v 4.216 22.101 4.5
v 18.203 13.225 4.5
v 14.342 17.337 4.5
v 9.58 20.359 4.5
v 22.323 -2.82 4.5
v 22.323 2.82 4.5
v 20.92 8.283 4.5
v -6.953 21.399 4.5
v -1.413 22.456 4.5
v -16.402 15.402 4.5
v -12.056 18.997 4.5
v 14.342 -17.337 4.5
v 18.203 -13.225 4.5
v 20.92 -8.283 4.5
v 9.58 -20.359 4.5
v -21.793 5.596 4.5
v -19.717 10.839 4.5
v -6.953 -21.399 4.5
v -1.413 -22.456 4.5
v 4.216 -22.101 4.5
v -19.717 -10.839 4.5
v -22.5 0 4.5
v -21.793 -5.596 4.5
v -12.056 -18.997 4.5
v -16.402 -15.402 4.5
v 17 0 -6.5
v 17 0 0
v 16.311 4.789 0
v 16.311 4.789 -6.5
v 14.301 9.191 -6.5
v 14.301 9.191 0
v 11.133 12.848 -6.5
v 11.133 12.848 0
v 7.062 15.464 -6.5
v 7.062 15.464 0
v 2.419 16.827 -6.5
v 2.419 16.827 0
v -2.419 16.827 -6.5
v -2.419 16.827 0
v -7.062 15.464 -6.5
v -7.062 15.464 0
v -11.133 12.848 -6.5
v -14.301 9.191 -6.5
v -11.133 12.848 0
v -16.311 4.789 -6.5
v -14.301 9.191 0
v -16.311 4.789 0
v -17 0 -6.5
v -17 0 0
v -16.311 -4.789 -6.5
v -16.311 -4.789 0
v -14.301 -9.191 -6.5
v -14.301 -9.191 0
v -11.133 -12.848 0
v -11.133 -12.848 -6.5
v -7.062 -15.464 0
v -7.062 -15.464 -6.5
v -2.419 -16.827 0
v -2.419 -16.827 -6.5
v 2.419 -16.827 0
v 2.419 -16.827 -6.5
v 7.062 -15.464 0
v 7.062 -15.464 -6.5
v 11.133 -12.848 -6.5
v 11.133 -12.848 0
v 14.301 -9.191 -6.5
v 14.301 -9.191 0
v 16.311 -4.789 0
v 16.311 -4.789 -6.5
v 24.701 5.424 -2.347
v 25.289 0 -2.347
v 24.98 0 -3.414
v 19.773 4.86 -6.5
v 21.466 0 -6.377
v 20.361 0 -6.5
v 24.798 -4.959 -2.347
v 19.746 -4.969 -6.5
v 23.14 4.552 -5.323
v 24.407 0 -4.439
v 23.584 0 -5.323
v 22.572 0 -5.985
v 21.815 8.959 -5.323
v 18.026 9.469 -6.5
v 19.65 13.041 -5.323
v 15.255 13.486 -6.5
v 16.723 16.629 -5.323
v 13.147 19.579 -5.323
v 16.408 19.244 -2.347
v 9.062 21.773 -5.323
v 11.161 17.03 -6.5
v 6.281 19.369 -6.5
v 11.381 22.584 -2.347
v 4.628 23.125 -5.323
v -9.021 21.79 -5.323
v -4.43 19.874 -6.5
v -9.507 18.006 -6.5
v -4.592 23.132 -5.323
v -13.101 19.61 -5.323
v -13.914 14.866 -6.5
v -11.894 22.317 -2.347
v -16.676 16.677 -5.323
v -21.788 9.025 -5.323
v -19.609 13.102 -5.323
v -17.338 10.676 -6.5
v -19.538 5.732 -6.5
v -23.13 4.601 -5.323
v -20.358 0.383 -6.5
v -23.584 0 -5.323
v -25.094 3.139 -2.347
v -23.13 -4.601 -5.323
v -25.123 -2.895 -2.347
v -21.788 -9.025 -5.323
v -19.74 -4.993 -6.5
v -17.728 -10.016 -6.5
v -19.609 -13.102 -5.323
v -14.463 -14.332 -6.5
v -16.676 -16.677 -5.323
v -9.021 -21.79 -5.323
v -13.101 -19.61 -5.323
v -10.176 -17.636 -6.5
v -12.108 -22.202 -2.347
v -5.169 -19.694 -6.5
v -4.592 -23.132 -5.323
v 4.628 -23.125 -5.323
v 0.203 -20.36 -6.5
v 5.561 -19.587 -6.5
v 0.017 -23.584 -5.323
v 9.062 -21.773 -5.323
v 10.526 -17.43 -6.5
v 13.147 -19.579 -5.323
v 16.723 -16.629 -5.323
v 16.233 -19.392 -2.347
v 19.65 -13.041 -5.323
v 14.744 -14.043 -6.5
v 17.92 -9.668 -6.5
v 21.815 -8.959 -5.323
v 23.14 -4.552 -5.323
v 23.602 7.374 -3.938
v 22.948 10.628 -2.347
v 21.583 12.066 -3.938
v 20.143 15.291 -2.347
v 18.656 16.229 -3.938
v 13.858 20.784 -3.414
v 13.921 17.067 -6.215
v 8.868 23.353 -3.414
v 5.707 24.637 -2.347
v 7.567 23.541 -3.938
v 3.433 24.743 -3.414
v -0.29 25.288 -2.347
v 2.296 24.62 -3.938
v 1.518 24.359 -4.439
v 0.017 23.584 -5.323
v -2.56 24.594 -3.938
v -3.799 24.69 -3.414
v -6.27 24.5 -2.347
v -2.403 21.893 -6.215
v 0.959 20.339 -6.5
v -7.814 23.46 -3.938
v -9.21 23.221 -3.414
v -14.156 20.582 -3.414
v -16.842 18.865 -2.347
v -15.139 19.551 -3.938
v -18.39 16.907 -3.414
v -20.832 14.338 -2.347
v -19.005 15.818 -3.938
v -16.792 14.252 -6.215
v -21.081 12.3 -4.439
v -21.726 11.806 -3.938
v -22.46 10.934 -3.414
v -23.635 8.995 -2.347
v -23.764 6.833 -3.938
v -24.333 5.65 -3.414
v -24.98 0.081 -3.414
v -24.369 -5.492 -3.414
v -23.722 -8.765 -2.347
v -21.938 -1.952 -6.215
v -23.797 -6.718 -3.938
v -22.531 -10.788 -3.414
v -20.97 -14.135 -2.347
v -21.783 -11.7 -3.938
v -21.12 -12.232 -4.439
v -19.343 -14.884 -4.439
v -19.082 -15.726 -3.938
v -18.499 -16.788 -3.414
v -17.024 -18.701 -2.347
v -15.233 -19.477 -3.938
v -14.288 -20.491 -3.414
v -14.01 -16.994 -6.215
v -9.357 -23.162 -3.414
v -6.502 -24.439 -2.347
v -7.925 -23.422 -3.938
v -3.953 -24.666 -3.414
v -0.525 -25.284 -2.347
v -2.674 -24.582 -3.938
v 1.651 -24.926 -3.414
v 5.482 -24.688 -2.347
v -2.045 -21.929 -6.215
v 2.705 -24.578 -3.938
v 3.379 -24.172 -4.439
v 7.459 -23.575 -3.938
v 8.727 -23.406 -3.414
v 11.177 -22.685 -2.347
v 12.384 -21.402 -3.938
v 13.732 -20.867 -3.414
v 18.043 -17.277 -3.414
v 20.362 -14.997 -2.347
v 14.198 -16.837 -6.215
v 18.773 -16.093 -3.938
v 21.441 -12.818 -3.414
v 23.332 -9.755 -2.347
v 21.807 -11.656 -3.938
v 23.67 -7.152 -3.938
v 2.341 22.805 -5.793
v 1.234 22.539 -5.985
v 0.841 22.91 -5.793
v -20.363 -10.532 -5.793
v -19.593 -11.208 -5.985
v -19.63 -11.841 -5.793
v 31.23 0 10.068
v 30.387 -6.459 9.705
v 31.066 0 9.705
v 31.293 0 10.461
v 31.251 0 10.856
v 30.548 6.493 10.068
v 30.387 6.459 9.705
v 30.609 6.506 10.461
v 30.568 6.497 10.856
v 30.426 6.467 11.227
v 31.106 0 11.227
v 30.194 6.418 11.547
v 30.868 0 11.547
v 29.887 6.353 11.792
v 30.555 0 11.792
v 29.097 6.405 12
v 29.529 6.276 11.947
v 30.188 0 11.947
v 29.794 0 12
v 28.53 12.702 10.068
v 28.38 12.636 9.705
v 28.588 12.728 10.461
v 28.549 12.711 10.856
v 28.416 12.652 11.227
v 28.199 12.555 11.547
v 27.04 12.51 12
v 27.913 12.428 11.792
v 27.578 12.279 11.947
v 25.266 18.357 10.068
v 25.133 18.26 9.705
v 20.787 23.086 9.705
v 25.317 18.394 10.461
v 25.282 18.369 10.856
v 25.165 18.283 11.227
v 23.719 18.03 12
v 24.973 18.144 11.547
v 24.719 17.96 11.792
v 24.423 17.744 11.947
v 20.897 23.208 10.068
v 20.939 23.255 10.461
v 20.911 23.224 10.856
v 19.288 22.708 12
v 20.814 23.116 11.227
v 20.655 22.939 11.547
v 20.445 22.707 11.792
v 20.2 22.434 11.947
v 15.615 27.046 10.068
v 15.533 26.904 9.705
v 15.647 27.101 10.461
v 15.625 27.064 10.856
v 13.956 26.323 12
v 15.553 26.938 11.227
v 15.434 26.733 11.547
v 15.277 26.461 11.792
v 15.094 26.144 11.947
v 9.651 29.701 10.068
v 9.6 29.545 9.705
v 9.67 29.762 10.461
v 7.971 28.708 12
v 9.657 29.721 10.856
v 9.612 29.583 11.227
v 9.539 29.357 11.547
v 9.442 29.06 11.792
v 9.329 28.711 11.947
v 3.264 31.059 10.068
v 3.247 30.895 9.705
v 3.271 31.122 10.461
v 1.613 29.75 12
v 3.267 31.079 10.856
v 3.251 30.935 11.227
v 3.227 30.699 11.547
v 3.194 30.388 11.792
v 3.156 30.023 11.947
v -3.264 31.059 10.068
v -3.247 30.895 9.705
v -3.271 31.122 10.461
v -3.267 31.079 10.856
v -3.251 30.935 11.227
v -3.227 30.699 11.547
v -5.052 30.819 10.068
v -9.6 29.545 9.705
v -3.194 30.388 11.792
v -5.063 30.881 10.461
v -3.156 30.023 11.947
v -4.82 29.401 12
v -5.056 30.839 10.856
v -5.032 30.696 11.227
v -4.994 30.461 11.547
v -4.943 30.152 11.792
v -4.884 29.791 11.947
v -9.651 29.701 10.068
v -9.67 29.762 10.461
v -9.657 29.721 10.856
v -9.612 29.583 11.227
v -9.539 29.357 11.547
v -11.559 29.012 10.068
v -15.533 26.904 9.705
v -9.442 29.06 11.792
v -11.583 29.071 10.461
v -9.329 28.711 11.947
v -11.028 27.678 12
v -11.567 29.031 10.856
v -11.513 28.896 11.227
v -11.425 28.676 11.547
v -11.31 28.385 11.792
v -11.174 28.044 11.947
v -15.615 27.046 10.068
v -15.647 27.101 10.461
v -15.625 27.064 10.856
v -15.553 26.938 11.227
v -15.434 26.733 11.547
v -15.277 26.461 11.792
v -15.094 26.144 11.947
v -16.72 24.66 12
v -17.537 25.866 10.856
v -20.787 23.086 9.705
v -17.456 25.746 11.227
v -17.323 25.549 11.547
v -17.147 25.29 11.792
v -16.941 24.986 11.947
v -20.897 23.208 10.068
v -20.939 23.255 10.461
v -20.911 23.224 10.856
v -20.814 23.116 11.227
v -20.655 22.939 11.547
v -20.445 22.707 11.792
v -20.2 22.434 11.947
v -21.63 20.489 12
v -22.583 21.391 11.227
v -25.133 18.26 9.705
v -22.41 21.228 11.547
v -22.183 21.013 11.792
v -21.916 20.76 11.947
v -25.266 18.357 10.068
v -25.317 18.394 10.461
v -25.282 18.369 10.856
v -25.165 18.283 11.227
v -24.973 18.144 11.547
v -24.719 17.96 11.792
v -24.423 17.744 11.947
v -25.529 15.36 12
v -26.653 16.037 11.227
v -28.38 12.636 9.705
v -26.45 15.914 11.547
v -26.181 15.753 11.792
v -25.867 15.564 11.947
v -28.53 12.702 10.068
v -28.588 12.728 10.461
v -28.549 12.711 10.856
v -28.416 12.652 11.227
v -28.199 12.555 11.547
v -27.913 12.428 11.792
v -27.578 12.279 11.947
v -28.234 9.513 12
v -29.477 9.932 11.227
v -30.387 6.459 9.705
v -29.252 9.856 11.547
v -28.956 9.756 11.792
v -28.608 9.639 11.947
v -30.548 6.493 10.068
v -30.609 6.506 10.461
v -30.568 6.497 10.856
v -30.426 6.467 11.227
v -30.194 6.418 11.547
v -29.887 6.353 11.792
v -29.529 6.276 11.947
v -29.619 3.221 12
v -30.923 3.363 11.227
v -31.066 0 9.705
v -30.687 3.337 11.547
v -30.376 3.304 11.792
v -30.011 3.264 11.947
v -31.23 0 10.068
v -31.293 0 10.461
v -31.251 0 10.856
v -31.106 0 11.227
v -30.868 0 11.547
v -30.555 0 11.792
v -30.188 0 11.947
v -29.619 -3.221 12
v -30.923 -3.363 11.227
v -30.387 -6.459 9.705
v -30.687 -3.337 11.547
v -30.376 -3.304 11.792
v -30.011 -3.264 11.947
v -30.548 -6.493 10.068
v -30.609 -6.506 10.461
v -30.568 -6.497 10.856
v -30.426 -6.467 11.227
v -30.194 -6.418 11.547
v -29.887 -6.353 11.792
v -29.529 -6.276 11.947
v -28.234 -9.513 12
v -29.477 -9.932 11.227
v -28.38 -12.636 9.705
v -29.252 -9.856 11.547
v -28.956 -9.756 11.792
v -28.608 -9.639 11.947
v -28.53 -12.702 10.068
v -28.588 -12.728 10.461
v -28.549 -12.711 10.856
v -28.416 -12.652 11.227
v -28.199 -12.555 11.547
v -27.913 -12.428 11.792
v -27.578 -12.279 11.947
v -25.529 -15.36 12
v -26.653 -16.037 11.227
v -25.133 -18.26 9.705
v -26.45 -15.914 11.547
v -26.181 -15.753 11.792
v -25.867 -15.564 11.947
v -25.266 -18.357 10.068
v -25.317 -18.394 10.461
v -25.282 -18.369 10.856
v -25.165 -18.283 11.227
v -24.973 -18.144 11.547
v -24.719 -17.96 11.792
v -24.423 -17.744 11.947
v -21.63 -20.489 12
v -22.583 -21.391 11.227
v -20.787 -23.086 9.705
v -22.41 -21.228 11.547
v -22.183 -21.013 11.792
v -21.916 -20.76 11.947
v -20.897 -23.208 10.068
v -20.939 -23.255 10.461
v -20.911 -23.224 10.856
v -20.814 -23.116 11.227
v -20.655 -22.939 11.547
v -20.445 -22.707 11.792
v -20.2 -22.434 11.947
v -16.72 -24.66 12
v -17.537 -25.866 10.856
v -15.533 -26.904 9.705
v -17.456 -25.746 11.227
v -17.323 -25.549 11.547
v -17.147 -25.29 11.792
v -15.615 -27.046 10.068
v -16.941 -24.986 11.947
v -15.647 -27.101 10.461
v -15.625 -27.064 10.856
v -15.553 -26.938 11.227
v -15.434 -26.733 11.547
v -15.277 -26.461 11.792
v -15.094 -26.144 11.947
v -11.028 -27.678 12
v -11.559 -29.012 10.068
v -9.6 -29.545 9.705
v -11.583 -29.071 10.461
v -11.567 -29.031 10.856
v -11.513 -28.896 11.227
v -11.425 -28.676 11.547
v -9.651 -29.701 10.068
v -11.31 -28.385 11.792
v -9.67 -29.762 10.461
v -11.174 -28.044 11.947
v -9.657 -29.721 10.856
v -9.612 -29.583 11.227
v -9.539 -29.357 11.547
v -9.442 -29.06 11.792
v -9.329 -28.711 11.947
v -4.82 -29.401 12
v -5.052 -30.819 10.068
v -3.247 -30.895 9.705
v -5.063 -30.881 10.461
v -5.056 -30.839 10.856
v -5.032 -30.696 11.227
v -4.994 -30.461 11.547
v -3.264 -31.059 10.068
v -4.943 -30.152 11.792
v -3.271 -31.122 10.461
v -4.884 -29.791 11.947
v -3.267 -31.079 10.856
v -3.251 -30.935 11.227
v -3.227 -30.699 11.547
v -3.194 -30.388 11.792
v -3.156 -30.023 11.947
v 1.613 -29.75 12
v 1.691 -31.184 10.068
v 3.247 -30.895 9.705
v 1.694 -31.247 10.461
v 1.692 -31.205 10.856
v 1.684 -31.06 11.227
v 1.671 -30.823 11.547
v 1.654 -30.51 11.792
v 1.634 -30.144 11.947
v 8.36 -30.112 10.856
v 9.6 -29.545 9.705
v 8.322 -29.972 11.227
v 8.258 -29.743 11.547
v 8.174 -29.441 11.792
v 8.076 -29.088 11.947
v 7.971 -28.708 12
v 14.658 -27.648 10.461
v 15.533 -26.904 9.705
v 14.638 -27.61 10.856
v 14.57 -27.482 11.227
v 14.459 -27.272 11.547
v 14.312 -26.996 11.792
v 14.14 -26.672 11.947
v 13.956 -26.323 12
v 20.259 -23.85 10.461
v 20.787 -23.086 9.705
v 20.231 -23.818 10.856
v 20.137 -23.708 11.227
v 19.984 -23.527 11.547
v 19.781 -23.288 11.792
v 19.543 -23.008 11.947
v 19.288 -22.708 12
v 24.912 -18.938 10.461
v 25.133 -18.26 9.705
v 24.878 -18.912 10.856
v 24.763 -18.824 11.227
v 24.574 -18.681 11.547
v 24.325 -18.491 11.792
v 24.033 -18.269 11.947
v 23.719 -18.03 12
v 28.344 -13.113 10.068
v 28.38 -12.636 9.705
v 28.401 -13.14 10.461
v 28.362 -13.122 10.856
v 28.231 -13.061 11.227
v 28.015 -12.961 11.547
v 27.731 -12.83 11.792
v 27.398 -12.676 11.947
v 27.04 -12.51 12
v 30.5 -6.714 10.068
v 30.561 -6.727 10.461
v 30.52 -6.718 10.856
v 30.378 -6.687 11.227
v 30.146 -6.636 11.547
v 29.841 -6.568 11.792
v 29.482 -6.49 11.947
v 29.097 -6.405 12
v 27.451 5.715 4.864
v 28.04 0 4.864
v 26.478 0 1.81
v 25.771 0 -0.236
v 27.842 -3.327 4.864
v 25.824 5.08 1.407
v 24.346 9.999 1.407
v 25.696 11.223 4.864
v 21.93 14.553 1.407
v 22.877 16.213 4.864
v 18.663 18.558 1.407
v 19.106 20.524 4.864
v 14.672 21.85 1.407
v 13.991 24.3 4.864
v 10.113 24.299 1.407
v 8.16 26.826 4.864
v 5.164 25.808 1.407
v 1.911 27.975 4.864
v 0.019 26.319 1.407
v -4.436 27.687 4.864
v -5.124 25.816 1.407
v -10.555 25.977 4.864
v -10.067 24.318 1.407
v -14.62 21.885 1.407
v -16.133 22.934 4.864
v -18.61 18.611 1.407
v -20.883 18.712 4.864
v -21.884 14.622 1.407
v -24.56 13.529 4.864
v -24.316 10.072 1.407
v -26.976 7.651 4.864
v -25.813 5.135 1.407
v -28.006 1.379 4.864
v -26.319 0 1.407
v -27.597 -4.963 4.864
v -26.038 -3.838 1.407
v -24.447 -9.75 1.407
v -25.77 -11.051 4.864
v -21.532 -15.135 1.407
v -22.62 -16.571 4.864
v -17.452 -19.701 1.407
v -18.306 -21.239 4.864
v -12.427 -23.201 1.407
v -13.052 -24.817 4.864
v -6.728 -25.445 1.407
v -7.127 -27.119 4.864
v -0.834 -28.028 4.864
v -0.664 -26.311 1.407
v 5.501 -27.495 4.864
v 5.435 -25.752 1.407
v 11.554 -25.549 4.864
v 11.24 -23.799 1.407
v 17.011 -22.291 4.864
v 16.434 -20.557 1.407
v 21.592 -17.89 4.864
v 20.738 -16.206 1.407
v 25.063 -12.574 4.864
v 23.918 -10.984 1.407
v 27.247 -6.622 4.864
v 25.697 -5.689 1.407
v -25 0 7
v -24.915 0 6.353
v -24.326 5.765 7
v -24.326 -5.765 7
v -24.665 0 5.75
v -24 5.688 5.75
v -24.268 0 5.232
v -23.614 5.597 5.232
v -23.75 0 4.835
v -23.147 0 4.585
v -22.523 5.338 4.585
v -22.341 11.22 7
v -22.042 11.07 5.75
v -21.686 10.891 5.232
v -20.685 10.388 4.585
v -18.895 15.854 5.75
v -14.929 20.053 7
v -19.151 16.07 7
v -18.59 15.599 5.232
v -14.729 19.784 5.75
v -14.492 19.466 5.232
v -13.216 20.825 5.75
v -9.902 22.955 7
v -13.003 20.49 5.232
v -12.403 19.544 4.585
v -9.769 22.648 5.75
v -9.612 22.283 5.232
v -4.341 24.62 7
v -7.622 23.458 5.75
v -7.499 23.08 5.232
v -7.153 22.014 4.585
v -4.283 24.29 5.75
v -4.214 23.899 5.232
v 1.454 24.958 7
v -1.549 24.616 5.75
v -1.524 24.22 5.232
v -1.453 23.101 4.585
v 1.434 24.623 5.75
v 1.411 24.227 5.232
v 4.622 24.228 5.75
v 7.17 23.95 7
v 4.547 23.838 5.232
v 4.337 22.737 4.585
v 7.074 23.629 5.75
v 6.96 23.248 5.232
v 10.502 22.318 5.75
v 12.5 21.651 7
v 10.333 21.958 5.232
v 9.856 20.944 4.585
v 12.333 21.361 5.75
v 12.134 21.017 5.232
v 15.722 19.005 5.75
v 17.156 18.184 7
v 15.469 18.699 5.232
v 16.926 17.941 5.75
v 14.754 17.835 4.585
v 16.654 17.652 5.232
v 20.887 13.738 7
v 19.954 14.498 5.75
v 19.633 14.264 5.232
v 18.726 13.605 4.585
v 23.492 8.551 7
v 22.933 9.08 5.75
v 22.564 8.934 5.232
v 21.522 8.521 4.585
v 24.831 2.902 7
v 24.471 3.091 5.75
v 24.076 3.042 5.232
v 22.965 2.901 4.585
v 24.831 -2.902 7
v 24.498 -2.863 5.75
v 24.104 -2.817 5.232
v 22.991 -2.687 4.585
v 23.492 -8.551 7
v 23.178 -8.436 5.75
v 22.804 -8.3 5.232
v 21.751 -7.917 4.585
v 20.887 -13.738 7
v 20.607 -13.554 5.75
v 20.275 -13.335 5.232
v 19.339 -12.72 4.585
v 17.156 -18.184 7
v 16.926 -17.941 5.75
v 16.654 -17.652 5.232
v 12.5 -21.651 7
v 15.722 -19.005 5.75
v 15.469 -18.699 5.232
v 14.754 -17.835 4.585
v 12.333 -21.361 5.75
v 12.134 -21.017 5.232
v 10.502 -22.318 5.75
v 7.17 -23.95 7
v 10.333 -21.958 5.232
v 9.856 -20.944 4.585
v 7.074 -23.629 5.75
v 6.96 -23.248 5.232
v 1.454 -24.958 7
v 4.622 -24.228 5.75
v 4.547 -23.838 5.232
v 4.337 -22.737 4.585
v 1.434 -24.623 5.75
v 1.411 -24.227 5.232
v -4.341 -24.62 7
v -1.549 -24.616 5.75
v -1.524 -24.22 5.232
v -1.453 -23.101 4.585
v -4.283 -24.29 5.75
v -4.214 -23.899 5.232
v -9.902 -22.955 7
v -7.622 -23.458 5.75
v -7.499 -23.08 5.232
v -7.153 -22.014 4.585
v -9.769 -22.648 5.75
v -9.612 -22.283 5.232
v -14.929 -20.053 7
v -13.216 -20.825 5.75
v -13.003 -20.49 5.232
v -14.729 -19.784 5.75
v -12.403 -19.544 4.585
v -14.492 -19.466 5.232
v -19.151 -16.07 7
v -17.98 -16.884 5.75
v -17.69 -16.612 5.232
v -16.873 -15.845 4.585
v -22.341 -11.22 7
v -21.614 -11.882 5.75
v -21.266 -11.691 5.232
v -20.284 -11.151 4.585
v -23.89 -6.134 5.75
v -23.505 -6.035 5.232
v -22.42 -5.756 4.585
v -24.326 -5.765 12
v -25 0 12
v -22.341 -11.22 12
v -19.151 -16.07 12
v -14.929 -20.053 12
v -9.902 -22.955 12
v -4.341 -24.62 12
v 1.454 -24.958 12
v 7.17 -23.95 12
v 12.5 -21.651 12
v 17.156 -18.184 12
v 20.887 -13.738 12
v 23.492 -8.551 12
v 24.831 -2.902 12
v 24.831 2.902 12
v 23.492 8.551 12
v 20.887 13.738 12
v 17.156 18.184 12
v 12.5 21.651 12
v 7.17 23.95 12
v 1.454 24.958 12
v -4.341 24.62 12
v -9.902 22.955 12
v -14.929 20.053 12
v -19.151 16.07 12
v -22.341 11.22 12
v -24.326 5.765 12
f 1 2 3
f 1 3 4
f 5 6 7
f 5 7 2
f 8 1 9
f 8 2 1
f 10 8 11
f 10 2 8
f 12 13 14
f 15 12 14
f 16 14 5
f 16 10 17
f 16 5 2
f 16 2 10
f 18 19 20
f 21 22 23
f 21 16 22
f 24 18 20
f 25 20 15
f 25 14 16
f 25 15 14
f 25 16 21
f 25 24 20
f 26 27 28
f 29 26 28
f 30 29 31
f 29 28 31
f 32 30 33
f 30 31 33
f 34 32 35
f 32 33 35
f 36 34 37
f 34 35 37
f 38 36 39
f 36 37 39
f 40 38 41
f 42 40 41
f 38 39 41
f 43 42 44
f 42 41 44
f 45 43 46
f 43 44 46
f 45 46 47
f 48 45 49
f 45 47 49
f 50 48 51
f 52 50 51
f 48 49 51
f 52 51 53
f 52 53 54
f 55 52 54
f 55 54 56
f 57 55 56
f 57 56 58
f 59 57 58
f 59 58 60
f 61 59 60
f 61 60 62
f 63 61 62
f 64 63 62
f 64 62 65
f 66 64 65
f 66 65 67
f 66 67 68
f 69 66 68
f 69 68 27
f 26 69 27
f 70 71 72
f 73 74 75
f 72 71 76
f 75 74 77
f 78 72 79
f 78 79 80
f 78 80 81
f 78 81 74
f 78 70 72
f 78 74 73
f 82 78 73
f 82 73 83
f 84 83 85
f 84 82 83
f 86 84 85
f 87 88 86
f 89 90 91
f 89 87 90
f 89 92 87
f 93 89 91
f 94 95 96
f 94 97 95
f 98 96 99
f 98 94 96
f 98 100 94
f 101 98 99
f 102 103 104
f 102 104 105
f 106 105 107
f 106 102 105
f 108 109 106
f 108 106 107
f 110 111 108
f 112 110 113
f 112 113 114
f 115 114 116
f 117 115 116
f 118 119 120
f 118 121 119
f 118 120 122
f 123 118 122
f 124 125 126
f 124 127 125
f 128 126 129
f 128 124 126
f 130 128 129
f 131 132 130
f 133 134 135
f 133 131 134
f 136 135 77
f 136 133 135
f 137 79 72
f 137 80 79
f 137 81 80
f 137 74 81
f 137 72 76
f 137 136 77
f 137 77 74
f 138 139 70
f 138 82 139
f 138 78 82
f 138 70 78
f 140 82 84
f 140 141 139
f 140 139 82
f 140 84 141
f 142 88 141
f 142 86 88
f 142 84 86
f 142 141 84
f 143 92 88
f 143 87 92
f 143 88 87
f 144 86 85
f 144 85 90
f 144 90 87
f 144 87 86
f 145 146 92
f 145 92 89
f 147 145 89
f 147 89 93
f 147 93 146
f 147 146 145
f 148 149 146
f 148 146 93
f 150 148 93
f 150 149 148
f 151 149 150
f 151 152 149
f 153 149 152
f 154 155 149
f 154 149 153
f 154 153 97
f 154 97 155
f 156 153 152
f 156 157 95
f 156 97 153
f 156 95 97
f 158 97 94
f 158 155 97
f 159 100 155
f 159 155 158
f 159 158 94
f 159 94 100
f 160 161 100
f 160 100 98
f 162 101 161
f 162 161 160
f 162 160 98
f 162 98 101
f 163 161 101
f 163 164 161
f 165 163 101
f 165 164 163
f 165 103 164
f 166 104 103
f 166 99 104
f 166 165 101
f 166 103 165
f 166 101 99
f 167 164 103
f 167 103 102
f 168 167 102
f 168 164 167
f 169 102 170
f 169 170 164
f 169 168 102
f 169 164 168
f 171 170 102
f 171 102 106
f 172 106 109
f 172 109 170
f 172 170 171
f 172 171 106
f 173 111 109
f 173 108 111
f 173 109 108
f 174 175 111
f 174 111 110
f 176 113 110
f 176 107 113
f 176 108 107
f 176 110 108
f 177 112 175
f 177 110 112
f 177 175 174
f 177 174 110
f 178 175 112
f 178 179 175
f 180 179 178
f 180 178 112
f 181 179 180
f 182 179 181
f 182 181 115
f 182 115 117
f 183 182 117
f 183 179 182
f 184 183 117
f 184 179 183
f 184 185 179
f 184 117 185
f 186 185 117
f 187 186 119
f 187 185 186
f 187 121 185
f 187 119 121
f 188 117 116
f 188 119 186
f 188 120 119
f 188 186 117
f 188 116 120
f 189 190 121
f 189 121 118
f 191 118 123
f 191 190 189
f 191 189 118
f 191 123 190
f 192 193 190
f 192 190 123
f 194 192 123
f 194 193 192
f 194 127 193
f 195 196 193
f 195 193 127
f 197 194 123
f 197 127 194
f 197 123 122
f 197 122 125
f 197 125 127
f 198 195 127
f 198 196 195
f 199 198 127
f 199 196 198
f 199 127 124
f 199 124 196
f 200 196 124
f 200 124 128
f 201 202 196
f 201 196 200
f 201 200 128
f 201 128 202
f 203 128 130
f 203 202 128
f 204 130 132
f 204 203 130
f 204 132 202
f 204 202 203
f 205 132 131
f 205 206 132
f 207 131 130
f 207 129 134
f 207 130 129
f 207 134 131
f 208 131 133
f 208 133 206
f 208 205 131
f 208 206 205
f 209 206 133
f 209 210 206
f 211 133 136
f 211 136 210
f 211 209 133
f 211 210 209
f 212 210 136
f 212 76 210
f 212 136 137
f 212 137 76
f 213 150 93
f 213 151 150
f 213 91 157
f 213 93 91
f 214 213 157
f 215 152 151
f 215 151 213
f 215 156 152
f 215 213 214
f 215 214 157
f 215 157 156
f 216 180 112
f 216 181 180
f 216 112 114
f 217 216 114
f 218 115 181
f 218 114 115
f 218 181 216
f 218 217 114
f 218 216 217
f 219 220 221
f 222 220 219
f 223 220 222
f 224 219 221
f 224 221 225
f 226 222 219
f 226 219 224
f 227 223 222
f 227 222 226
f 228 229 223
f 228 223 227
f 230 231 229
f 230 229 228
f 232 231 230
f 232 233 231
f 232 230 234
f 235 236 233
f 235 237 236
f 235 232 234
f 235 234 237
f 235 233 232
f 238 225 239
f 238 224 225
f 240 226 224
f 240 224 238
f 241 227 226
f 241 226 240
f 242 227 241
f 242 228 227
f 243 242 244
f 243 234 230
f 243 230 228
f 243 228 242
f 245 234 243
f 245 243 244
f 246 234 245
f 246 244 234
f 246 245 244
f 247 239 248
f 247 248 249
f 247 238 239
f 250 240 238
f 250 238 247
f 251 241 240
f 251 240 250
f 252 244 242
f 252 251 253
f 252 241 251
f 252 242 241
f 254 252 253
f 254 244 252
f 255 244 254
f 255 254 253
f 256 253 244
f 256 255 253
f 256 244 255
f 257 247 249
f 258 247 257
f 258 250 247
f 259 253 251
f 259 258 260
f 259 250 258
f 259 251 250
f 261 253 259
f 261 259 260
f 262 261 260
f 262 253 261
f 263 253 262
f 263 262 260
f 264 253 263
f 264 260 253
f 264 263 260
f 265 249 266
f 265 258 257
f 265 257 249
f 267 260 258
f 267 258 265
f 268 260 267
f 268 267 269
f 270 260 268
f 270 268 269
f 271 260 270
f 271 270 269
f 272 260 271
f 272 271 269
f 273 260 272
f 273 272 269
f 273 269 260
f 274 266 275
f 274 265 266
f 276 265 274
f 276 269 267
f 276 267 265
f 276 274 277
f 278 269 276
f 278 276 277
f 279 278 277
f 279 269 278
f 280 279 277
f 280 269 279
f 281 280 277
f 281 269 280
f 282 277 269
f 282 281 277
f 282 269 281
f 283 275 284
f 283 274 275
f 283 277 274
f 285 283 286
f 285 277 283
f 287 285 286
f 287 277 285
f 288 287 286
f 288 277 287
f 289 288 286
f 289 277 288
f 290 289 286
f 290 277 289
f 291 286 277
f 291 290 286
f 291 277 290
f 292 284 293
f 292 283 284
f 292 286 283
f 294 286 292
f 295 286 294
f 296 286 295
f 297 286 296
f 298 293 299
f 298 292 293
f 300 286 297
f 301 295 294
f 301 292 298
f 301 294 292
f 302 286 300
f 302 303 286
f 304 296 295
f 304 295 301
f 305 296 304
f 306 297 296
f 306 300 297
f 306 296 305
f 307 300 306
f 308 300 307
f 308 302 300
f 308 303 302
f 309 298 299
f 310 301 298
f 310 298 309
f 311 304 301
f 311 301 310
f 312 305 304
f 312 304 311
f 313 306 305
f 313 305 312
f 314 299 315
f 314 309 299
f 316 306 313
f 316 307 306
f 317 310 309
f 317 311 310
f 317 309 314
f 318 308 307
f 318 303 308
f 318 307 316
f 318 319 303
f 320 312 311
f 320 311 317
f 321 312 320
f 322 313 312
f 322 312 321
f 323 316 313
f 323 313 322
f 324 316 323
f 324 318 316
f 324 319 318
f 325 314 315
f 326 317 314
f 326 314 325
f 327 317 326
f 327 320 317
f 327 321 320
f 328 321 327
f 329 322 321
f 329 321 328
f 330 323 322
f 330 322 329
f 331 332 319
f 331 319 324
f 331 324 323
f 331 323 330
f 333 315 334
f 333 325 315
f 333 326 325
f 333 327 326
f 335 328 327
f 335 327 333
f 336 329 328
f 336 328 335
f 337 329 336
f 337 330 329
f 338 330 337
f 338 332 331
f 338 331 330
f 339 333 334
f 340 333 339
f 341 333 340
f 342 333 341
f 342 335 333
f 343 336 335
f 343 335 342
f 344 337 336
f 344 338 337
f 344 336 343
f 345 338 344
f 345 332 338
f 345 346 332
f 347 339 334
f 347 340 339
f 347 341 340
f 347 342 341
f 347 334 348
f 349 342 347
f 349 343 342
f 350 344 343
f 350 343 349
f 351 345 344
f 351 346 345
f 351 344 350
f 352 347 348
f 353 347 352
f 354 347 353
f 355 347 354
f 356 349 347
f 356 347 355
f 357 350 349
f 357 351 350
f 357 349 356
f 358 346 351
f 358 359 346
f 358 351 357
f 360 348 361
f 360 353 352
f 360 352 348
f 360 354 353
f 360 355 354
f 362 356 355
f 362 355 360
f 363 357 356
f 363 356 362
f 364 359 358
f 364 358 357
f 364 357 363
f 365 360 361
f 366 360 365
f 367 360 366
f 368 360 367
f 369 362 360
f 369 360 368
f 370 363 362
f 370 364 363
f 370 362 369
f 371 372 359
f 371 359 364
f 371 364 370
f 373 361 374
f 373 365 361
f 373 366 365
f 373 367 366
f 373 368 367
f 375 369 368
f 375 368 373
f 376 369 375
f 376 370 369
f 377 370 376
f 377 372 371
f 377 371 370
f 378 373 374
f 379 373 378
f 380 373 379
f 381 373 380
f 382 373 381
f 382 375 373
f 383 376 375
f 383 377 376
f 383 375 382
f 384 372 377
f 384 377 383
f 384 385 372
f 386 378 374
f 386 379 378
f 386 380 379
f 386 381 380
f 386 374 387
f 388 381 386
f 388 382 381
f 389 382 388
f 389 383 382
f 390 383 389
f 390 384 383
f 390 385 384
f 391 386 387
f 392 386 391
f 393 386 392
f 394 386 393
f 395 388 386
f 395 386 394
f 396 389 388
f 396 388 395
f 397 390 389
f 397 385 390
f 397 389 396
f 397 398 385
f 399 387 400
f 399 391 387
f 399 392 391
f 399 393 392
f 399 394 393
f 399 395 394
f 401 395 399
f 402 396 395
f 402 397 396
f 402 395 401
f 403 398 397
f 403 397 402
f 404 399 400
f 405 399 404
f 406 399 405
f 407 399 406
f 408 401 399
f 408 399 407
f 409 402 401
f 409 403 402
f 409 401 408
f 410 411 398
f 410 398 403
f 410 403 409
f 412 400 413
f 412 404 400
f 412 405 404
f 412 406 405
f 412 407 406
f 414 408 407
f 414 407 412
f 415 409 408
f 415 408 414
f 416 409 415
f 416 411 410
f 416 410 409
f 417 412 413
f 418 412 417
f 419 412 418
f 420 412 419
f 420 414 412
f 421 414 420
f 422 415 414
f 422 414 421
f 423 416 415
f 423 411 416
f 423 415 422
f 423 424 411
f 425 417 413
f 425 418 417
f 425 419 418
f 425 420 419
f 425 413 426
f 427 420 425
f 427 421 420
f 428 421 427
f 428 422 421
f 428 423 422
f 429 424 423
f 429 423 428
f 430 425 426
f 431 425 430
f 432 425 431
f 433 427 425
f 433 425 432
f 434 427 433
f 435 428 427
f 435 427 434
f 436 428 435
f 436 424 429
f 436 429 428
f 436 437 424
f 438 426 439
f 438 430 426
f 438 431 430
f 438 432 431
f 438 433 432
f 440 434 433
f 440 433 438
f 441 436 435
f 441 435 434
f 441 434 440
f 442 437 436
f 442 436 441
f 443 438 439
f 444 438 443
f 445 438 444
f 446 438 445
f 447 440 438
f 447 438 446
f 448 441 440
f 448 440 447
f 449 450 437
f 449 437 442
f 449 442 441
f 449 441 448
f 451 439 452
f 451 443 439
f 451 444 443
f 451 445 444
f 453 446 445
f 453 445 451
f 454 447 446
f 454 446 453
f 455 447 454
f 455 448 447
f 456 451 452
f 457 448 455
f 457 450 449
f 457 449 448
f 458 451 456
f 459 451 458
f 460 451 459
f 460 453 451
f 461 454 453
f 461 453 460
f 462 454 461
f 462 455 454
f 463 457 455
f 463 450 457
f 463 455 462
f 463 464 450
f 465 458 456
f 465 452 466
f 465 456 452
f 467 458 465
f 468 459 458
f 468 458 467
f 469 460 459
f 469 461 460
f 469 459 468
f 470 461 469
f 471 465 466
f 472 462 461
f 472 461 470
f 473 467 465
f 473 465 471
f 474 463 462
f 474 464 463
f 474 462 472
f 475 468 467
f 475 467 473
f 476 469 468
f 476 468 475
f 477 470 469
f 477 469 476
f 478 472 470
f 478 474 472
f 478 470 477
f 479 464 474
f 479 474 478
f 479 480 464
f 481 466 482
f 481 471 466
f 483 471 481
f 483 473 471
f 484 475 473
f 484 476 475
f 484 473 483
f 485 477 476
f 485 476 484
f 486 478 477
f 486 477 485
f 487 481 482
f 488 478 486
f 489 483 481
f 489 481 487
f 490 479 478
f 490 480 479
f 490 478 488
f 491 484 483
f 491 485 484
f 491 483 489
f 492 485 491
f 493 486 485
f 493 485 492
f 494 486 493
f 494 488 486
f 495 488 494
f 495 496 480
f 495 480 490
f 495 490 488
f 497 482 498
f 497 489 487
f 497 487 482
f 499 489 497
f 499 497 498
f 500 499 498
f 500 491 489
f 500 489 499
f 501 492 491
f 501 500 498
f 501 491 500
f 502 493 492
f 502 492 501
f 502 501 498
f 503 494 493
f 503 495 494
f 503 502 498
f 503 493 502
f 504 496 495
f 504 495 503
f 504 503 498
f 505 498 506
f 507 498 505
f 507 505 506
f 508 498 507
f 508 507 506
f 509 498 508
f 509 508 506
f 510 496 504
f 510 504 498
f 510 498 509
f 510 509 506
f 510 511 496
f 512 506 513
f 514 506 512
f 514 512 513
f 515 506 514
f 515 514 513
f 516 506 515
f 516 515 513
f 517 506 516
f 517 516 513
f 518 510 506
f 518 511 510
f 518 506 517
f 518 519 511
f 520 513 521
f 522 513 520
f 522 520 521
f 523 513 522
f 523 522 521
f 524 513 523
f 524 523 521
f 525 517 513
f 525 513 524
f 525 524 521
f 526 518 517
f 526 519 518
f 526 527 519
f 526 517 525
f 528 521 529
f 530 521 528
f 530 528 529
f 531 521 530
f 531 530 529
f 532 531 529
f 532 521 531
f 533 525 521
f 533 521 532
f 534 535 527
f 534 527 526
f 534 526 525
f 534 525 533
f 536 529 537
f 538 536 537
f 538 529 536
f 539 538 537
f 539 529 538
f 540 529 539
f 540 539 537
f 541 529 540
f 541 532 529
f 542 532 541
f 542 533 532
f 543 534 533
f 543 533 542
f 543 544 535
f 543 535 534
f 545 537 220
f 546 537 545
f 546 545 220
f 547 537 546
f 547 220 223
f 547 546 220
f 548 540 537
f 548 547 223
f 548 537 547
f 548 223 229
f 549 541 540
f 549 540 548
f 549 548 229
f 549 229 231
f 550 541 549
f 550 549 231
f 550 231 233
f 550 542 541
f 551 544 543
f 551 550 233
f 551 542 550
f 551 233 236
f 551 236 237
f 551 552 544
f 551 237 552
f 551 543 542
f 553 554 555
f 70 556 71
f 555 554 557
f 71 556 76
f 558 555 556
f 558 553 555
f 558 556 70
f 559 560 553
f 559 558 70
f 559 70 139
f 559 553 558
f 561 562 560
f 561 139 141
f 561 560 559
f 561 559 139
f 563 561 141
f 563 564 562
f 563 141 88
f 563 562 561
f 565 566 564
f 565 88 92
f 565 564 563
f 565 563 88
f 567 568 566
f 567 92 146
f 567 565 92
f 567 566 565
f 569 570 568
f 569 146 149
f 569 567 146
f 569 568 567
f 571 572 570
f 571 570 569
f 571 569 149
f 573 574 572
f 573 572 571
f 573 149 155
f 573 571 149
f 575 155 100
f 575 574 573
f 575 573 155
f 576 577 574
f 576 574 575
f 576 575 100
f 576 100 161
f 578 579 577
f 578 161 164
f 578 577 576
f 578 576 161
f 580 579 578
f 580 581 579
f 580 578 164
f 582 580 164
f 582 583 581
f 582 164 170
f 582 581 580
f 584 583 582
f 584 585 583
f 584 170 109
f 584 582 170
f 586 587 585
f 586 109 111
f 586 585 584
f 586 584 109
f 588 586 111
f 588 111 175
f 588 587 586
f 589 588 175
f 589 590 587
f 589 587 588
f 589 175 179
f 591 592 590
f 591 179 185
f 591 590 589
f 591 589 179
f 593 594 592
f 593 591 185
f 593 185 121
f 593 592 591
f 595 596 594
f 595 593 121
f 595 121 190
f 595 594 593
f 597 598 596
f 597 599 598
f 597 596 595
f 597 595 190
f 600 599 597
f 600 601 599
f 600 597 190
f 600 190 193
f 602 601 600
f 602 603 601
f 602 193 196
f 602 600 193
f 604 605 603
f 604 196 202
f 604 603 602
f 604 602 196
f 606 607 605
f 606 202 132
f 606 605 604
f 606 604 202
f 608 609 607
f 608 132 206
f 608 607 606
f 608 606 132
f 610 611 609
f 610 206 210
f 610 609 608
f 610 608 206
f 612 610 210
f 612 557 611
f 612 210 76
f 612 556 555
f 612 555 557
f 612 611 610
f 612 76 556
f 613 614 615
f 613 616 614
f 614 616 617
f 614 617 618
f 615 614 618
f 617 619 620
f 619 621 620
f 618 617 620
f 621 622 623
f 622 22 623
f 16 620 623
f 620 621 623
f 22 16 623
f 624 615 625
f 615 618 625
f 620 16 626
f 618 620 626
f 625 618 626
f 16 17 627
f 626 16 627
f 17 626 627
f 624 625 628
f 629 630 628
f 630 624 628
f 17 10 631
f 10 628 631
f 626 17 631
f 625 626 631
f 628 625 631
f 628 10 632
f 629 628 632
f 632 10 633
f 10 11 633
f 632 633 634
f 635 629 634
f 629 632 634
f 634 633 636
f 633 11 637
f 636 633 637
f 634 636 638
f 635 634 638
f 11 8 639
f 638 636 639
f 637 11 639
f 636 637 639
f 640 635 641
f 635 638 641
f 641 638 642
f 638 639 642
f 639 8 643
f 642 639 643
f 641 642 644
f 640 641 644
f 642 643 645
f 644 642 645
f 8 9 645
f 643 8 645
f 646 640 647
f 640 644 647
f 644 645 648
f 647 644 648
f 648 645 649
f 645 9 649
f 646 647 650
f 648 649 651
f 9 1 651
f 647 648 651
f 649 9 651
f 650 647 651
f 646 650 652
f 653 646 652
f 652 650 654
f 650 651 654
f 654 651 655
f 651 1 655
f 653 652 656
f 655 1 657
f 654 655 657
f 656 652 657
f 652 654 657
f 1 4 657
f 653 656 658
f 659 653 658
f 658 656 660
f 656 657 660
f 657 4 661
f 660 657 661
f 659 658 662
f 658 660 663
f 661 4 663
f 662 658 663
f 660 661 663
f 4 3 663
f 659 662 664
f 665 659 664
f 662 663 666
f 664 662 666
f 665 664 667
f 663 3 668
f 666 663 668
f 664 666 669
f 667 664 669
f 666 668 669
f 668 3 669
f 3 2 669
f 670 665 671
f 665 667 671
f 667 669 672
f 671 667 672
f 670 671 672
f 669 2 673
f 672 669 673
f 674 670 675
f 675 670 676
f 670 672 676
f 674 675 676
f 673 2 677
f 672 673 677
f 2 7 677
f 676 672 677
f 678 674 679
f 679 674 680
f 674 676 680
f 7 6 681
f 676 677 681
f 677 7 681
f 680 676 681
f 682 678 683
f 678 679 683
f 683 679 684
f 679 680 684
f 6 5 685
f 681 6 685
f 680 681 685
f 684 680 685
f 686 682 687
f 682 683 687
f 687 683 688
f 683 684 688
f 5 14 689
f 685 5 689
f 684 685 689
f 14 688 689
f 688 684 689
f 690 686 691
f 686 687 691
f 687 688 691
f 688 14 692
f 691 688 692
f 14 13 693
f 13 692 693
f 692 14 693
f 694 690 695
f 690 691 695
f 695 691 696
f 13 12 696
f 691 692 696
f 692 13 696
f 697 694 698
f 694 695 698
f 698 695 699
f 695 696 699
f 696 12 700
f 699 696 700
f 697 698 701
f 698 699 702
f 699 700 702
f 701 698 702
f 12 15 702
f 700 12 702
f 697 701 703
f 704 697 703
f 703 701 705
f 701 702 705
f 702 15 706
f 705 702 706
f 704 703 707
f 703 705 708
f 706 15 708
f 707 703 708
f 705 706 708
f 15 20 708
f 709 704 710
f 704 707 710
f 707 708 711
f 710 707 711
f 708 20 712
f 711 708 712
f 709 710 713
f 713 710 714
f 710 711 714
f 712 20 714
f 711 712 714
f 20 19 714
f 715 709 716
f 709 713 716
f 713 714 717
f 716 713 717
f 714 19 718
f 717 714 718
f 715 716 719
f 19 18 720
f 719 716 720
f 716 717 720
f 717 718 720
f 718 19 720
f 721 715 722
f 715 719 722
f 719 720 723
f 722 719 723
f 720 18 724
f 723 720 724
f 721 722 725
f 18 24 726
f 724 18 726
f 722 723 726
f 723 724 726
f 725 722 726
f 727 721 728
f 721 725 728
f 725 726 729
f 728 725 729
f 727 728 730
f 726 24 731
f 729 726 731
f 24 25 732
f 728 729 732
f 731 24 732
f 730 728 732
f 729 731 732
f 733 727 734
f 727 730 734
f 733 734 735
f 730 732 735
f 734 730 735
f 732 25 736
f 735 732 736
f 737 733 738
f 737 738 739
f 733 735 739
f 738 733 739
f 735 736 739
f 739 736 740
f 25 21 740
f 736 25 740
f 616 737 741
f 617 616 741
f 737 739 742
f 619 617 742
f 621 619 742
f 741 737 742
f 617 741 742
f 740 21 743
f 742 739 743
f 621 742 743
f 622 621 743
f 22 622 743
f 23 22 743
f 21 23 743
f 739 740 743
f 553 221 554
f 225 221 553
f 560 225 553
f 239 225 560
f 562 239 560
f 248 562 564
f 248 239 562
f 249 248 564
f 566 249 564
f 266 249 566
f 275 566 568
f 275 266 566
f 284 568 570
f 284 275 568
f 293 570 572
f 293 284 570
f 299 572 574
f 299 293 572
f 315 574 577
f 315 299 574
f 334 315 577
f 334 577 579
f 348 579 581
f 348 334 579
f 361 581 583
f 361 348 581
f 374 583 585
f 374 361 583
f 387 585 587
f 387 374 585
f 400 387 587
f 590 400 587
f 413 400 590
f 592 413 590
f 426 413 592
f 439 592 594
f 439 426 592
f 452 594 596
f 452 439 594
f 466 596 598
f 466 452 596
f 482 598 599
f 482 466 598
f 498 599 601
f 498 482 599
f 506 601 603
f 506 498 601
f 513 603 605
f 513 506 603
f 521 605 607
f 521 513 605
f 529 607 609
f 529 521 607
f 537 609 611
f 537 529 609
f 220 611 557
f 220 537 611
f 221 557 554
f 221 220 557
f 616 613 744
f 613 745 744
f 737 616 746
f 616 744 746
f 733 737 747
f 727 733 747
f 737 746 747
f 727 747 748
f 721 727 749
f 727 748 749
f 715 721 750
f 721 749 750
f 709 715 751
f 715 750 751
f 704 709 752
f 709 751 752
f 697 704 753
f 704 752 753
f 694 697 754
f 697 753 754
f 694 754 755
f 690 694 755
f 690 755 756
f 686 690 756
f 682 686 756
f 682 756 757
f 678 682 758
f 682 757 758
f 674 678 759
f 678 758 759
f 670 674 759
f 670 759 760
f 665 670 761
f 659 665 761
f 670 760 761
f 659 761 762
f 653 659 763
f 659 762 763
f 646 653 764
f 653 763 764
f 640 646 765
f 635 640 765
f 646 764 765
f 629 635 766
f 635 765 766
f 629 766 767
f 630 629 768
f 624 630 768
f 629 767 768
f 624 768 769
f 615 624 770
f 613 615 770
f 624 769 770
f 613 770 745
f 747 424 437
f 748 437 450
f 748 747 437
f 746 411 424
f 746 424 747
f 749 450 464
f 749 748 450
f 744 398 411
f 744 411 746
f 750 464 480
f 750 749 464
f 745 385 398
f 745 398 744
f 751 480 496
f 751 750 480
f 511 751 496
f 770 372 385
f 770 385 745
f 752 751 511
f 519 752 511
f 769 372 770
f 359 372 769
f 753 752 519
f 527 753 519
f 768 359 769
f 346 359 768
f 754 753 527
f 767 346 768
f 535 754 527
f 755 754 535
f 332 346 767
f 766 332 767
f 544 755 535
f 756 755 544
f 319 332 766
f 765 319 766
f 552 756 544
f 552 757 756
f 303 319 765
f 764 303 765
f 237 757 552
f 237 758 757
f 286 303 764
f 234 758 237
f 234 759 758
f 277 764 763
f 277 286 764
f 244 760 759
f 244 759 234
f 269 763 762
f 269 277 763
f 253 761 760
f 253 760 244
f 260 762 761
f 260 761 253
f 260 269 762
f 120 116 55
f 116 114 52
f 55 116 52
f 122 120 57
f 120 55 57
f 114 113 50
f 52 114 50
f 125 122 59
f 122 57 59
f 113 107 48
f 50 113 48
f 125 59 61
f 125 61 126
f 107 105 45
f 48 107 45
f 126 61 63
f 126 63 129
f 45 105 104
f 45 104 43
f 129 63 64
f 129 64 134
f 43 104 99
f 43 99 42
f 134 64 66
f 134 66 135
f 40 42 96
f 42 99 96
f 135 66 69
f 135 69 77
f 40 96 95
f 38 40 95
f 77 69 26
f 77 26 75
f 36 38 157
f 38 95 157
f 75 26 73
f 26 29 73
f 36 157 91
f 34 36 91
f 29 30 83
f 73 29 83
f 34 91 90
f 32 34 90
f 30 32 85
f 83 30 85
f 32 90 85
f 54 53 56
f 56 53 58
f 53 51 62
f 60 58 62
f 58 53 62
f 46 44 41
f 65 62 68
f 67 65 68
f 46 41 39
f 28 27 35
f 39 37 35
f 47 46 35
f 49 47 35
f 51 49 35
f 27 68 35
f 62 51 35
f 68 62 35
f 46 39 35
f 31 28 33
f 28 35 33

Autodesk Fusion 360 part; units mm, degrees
sketch "Sketch1" plane through (0, 0, 0) normal (0, 0, 1) x (1, 0, 0)
  circle A0 centre (0, 0) radius 17
  circle A1 centre (0, 0) radius 25
  dimension "d1" = 34
  dimension "d2" = 50
ref_plane "WorkPlane1" through (0, 0, 12) normal (0, 0, 1) x (1, 0, 0)
sketch "Sketch2" plane through (0, 0, 12) normal (0, 0, 1) x (1, 0, 0)
  circle A0 centre (0, 0) radius 32.5
  dimension "d4" = 65
loft "Loft1" add profiles "Sketch2", "Sketch1" section 1 section 2
extrude "Extrude1" add sketch "Sketch1" against normal blind 6.5
fillet "Fillet1" radius 1.5 1 edges at (-30.3006, 11.7525, 12)
fillet "Fillet2" radius 20 1 edges at (-23.3082, -9.0404, 0)
fillet "Fillet3" radius 5 1 edges at (-23.3082, 9.0404, -6.5)
sketch "Sketch3" plane through (0, 0, 12) normal (0, 0, 1) x (-1, 0, 0)
  circle A0 centre (0, 0) radius 29.7936
  circle A1 centre (0, 0) radius 25
  dimension "d13" = 50
extrude "Extrude2" cut sketch "Sketch3" against normal blind 7.5 contours A1
fillet "Fillet4" radius 2.5 1 edges at (23.3082, -9.0404, 4.5)
